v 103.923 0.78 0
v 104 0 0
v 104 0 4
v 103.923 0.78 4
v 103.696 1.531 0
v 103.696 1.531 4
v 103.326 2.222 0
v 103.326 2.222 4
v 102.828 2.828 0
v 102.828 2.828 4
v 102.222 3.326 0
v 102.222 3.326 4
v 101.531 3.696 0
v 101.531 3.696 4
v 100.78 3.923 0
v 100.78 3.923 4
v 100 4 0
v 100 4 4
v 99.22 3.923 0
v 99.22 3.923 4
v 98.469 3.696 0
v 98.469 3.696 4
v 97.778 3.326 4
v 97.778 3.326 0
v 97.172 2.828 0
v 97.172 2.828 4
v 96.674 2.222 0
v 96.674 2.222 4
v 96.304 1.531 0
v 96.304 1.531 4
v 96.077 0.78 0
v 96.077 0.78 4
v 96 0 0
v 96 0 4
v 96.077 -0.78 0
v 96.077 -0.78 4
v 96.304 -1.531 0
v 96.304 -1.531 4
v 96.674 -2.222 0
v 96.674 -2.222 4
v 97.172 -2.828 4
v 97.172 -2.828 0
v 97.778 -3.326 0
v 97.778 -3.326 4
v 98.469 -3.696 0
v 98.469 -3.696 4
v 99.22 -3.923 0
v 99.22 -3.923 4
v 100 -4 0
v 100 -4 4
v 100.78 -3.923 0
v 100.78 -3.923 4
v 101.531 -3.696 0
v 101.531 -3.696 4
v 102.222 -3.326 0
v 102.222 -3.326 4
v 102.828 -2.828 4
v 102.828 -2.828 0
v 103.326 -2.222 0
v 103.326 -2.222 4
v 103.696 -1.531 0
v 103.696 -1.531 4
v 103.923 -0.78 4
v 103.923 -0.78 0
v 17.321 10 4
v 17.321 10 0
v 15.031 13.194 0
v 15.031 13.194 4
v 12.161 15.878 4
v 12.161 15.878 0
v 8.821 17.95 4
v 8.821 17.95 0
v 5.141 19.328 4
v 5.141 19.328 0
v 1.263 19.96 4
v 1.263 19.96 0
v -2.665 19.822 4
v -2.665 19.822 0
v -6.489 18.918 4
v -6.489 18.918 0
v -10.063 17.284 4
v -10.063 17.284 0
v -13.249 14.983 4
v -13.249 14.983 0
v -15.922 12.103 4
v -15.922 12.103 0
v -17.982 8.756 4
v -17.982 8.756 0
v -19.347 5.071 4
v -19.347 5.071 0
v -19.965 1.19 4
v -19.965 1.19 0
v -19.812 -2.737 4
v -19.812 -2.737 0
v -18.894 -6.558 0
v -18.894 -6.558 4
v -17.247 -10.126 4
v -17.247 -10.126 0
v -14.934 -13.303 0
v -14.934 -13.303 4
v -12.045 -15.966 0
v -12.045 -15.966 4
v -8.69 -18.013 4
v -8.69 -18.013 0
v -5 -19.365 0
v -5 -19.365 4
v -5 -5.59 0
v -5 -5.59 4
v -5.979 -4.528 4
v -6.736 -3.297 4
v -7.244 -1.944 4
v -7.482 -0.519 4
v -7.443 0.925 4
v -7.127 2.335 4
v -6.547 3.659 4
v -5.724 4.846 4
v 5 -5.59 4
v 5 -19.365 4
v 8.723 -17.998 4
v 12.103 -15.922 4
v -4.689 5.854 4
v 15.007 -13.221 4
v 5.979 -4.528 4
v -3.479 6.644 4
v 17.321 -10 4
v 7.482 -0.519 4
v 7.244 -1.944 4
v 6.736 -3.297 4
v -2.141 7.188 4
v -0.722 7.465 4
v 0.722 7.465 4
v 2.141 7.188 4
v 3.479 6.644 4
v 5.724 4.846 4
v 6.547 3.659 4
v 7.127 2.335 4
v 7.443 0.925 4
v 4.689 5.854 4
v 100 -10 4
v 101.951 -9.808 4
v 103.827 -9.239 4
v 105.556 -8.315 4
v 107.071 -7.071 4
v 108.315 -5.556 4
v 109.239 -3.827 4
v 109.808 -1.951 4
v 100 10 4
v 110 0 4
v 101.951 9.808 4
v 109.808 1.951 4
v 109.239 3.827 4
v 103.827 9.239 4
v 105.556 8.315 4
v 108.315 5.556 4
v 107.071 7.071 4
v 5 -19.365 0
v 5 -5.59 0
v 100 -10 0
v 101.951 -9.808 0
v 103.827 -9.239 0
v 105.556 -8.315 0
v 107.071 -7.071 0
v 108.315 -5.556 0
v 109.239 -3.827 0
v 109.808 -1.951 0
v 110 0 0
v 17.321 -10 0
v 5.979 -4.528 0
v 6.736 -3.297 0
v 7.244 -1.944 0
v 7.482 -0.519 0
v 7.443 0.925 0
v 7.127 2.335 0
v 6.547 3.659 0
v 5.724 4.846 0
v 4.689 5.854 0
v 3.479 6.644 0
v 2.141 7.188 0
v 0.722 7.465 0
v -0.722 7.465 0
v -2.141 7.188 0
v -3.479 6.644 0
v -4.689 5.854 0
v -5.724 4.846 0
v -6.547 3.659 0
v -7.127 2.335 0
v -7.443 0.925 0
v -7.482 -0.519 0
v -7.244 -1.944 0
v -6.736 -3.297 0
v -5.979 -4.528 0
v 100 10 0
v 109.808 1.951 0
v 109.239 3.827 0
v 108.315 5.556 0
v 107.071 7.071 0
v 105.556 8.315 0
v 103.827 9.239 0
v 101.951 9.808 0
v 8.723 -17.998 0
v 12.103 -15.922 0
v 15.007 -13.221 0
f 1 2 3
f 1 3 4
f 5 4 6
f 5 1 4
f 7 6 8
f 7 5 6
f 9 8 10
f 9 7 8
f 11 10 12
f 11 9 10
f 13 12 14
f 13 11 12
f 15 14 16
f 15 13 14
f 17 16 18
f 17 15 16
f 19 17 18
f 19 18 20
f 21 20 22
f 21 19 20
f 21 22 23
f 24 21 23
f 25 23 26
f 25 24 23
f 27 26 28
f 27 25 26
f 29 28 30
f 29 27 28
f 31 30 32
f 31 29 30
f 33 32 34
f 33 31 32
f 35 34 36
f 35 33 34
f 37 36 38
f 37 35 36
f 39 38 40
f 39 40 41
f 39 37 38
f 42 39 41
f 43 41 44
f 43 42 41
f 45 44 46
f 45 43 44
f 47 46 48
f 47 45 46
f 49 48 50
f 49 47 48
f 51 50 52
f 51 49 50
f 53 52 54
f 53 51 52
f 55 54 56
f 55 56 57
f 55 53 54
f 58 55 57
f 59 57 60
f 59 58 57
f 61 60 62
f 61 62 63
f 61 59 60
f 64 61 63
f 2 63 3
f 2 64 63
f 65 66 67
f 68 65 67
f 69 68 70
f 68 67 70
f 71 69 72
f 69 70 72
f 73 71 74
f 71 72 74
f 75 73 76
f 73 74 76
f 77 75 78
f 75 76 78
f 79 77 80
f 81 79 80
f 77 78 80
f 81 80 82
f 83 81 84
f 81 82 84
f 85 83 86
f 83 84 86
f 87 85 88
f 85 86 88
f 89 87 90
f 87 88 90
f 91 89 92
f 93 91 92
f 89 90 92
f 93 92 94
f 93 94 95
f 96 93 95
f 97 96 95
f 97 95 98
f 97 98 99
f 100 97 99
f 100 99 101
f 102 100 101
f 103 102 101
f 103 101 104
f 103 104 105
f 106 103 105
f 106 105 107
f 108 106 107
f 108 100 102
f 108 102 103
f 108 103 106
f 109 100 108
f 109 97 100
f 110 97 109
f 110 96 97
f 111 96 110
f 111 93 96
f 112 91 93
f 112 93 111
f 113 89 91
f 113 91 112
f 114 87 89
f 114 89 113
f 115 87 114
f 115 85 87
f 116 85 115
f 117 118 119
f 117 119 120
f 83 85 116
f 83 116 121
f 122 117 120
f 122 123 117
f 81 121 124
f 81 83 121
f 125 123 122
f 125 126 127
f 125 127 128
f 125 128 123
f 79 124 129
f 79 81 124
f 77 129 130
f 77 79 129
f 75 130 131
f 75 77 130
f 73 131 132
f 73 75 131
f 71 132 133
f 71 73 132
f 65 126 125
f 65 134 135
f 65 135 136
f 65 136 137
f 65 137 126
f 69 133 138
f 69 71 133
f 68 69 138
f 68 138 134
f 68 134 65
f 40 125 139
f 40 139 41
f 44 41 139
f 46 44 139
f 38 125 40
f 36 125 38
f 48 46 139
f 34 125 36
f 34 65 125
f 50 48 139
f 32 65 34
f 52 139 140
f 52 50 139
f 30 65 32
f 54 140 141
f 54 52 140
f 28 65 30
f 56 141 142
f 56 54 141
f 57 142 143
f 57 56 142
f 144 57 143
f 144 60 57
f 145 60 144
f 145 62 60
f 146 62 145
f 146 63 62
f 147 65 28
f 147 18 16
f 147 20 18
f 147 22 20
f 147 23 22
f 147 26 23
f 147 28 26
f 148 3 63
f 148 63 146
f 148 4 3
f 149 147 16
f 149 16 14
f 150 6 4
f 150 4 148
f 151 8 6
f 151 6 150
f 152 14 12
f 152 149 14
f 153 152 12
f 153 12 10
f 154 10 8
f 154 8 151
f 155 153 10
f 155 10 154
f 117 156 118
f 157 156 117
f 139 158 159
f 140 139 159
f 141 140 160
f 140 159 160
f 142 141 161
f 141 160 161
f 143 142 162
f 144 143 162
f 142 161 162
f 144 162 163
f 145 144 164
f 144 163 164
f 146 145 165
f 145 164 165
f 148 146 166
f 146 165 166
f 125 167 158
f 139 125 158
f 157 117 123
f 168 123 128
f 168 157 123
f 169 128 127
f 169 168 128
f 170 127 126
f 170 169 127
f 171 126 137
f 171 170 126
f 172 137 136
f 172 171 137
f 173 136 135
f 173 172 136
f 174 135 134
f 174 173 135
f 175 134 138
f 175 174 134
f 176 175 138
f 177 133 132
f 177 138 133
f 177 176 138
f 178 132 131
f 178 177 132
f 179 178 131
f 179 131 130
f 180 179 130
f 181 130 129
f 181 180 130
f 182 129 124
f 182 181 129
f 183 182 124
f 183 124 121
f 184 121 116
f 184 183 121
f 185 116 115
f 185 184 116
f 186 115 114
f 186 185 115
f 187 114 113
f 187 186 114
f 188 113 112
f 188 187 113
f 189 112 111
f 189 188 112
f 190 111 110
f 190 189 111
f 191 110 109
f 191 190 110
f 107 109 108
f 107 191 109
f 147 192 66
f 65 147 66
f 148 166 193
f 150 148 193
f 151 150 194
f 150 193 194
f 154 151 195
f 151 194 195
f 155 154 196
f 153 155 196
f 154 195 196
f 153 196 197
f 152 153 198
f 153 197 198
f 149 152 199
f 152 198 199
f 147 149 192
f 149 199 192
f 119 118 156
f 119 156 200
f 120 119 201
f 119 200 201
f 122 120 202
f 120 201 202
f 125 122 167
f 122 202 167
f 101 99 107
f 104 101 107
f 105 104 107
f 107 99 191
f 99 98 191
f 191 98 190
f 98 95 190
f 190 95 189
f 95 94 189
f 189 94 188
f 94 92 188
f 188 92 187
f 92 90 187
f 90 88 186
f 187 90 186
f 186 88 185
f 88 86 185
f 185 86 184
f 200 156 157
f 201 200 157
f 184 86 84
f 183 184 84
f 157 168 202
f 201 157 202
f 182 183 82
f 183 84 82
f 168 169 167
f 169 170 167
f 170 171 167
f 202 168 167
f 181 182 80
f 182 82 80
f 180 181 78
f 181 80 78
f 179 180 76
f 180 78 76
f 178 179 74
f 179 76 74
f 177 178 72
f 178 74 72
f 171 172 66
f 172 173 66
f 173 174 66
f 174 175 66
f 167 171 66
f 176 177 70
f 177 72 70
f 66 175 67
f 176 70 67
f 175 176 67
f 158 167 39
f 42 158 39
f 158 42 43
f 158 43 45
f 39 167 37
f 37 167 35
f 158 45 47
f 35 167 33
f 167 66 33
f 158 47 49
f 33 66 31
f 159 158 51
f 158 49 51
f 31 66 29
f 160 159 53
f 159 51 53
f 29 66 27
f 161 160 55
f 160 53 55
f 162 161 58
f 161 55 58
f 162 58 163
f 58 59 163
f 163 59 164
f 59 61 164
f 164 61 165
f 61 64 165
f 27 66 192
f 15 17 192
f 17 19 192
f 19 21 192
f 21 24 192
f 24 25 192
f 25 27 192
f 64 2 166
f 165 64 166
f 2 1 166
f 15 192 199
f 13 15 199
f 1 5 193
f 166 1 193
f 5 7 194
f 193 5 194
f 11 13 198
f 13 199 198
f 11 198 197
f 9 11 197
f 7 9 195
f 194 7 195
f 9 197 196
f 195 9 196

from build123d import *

# Parameters (mm, degrees)
BOSS_EXTRUDE1_DEPTH = 4
SKETCH2_R           = 4
CUT_EXTRUDE1_DEPTH  = 4
SKETCH3_R           = 7.5
CUT_EXTRUDE2_DEPTH  = 4
SKETCH4_W           = 10
SKETCH4_H           = 21.533858591
CUT_EXTRUDE3_DEPTH  = 4


with BuildPart() as part:
    # Sketch1 → Boss-Extrude1 (new body)
    with BuildSketch(Plane.XY):
        with BuildLine():
            ThreePointArc((110, 0), (107.071067812, 7.071067812), (100, 10))
            Line((100, 10), (100, 0))
            Line((100, 0), (100, -10))
            ThreePointArc((100, -10), (107.071067812, -7.071067812), (110, 0))
        make_face()
        with BuildLine():
            Line((100, 0), (100, 10))
            ThreePointArc((100, 10), (90, 0), (100, -10))
            Line((100, -10), (100, 0))
        make_face()
        with BuildLine():
            Line((100, 10), (17.320508076, 10))
            ThreePointArc((17.320508076, 10), (19.318516526, 5.176380902), (20, 0))
            ThreePointArc((20, 0), (19.318516526, -5.176380902), (17.320508076, -10))
            Line((17.320508076, -10), (100, -10))
            ThreePointArc((100, -10), (90, 0), (100, 10))
        make_face()
        with BuildLine():
            Line((0, -10), (0, 0))
            Line((0, 0), (0, 10))
            Line((0, 10), (17.320508076, 10))
            ThreePointArc((17.320508076, 10), (-20, 0), (17.320508076, -10))
            Line((17.320508076, -10), (0, -10))
        make_face()
        with BuildLine():
            Line((0, 10), (0, 0))
            Line((0, 0), (0, -10))
            Line((0, -10), (17.320508076, -10))
            ThreePointArc((17.320508076, -10), (19.318516526, -5.176380902), (20, 0))
            ThreePointArc((20, 0), (19.318516526, 5.176380902), (17.320508076, 10))
            Line((17.320508076, 10), (0, 10))
        make_face()
    extrude(amount=BOSS_EXTRUDE1_DEPTH)

    # Sketch2 → Cut-Extrude1 (cut)
    with BuildSketch(Plane.XY):
        with Locations((100, 0)):
            Circle(SKETCH2_R)
    extrude(amount=CUT_EXTRUDE1_DEPTH, mode=Mode.SUBTRACT)

    # Sketch3 → Cut-Extrude2 (cut)
    with BuildSketch(Plane.XY):
        Circle(SKETCH3_R)
    extrude(amount=CUT_EXTRUDE2_DEPTH, mode=Mode.SUBTRACT)

    # Sketch4 → Cut-Extrude3 (cut)
    with BuildSketch(Plane.XY):
        with Locations((0, -14.149166362)):
            Rectangle(SKETCH4_W, SKETCH4_H)
    extrude(amount=CUT_EXTRUDE3_DEPTH, mode=Mode.SUBTRACT)


solid = part.part
